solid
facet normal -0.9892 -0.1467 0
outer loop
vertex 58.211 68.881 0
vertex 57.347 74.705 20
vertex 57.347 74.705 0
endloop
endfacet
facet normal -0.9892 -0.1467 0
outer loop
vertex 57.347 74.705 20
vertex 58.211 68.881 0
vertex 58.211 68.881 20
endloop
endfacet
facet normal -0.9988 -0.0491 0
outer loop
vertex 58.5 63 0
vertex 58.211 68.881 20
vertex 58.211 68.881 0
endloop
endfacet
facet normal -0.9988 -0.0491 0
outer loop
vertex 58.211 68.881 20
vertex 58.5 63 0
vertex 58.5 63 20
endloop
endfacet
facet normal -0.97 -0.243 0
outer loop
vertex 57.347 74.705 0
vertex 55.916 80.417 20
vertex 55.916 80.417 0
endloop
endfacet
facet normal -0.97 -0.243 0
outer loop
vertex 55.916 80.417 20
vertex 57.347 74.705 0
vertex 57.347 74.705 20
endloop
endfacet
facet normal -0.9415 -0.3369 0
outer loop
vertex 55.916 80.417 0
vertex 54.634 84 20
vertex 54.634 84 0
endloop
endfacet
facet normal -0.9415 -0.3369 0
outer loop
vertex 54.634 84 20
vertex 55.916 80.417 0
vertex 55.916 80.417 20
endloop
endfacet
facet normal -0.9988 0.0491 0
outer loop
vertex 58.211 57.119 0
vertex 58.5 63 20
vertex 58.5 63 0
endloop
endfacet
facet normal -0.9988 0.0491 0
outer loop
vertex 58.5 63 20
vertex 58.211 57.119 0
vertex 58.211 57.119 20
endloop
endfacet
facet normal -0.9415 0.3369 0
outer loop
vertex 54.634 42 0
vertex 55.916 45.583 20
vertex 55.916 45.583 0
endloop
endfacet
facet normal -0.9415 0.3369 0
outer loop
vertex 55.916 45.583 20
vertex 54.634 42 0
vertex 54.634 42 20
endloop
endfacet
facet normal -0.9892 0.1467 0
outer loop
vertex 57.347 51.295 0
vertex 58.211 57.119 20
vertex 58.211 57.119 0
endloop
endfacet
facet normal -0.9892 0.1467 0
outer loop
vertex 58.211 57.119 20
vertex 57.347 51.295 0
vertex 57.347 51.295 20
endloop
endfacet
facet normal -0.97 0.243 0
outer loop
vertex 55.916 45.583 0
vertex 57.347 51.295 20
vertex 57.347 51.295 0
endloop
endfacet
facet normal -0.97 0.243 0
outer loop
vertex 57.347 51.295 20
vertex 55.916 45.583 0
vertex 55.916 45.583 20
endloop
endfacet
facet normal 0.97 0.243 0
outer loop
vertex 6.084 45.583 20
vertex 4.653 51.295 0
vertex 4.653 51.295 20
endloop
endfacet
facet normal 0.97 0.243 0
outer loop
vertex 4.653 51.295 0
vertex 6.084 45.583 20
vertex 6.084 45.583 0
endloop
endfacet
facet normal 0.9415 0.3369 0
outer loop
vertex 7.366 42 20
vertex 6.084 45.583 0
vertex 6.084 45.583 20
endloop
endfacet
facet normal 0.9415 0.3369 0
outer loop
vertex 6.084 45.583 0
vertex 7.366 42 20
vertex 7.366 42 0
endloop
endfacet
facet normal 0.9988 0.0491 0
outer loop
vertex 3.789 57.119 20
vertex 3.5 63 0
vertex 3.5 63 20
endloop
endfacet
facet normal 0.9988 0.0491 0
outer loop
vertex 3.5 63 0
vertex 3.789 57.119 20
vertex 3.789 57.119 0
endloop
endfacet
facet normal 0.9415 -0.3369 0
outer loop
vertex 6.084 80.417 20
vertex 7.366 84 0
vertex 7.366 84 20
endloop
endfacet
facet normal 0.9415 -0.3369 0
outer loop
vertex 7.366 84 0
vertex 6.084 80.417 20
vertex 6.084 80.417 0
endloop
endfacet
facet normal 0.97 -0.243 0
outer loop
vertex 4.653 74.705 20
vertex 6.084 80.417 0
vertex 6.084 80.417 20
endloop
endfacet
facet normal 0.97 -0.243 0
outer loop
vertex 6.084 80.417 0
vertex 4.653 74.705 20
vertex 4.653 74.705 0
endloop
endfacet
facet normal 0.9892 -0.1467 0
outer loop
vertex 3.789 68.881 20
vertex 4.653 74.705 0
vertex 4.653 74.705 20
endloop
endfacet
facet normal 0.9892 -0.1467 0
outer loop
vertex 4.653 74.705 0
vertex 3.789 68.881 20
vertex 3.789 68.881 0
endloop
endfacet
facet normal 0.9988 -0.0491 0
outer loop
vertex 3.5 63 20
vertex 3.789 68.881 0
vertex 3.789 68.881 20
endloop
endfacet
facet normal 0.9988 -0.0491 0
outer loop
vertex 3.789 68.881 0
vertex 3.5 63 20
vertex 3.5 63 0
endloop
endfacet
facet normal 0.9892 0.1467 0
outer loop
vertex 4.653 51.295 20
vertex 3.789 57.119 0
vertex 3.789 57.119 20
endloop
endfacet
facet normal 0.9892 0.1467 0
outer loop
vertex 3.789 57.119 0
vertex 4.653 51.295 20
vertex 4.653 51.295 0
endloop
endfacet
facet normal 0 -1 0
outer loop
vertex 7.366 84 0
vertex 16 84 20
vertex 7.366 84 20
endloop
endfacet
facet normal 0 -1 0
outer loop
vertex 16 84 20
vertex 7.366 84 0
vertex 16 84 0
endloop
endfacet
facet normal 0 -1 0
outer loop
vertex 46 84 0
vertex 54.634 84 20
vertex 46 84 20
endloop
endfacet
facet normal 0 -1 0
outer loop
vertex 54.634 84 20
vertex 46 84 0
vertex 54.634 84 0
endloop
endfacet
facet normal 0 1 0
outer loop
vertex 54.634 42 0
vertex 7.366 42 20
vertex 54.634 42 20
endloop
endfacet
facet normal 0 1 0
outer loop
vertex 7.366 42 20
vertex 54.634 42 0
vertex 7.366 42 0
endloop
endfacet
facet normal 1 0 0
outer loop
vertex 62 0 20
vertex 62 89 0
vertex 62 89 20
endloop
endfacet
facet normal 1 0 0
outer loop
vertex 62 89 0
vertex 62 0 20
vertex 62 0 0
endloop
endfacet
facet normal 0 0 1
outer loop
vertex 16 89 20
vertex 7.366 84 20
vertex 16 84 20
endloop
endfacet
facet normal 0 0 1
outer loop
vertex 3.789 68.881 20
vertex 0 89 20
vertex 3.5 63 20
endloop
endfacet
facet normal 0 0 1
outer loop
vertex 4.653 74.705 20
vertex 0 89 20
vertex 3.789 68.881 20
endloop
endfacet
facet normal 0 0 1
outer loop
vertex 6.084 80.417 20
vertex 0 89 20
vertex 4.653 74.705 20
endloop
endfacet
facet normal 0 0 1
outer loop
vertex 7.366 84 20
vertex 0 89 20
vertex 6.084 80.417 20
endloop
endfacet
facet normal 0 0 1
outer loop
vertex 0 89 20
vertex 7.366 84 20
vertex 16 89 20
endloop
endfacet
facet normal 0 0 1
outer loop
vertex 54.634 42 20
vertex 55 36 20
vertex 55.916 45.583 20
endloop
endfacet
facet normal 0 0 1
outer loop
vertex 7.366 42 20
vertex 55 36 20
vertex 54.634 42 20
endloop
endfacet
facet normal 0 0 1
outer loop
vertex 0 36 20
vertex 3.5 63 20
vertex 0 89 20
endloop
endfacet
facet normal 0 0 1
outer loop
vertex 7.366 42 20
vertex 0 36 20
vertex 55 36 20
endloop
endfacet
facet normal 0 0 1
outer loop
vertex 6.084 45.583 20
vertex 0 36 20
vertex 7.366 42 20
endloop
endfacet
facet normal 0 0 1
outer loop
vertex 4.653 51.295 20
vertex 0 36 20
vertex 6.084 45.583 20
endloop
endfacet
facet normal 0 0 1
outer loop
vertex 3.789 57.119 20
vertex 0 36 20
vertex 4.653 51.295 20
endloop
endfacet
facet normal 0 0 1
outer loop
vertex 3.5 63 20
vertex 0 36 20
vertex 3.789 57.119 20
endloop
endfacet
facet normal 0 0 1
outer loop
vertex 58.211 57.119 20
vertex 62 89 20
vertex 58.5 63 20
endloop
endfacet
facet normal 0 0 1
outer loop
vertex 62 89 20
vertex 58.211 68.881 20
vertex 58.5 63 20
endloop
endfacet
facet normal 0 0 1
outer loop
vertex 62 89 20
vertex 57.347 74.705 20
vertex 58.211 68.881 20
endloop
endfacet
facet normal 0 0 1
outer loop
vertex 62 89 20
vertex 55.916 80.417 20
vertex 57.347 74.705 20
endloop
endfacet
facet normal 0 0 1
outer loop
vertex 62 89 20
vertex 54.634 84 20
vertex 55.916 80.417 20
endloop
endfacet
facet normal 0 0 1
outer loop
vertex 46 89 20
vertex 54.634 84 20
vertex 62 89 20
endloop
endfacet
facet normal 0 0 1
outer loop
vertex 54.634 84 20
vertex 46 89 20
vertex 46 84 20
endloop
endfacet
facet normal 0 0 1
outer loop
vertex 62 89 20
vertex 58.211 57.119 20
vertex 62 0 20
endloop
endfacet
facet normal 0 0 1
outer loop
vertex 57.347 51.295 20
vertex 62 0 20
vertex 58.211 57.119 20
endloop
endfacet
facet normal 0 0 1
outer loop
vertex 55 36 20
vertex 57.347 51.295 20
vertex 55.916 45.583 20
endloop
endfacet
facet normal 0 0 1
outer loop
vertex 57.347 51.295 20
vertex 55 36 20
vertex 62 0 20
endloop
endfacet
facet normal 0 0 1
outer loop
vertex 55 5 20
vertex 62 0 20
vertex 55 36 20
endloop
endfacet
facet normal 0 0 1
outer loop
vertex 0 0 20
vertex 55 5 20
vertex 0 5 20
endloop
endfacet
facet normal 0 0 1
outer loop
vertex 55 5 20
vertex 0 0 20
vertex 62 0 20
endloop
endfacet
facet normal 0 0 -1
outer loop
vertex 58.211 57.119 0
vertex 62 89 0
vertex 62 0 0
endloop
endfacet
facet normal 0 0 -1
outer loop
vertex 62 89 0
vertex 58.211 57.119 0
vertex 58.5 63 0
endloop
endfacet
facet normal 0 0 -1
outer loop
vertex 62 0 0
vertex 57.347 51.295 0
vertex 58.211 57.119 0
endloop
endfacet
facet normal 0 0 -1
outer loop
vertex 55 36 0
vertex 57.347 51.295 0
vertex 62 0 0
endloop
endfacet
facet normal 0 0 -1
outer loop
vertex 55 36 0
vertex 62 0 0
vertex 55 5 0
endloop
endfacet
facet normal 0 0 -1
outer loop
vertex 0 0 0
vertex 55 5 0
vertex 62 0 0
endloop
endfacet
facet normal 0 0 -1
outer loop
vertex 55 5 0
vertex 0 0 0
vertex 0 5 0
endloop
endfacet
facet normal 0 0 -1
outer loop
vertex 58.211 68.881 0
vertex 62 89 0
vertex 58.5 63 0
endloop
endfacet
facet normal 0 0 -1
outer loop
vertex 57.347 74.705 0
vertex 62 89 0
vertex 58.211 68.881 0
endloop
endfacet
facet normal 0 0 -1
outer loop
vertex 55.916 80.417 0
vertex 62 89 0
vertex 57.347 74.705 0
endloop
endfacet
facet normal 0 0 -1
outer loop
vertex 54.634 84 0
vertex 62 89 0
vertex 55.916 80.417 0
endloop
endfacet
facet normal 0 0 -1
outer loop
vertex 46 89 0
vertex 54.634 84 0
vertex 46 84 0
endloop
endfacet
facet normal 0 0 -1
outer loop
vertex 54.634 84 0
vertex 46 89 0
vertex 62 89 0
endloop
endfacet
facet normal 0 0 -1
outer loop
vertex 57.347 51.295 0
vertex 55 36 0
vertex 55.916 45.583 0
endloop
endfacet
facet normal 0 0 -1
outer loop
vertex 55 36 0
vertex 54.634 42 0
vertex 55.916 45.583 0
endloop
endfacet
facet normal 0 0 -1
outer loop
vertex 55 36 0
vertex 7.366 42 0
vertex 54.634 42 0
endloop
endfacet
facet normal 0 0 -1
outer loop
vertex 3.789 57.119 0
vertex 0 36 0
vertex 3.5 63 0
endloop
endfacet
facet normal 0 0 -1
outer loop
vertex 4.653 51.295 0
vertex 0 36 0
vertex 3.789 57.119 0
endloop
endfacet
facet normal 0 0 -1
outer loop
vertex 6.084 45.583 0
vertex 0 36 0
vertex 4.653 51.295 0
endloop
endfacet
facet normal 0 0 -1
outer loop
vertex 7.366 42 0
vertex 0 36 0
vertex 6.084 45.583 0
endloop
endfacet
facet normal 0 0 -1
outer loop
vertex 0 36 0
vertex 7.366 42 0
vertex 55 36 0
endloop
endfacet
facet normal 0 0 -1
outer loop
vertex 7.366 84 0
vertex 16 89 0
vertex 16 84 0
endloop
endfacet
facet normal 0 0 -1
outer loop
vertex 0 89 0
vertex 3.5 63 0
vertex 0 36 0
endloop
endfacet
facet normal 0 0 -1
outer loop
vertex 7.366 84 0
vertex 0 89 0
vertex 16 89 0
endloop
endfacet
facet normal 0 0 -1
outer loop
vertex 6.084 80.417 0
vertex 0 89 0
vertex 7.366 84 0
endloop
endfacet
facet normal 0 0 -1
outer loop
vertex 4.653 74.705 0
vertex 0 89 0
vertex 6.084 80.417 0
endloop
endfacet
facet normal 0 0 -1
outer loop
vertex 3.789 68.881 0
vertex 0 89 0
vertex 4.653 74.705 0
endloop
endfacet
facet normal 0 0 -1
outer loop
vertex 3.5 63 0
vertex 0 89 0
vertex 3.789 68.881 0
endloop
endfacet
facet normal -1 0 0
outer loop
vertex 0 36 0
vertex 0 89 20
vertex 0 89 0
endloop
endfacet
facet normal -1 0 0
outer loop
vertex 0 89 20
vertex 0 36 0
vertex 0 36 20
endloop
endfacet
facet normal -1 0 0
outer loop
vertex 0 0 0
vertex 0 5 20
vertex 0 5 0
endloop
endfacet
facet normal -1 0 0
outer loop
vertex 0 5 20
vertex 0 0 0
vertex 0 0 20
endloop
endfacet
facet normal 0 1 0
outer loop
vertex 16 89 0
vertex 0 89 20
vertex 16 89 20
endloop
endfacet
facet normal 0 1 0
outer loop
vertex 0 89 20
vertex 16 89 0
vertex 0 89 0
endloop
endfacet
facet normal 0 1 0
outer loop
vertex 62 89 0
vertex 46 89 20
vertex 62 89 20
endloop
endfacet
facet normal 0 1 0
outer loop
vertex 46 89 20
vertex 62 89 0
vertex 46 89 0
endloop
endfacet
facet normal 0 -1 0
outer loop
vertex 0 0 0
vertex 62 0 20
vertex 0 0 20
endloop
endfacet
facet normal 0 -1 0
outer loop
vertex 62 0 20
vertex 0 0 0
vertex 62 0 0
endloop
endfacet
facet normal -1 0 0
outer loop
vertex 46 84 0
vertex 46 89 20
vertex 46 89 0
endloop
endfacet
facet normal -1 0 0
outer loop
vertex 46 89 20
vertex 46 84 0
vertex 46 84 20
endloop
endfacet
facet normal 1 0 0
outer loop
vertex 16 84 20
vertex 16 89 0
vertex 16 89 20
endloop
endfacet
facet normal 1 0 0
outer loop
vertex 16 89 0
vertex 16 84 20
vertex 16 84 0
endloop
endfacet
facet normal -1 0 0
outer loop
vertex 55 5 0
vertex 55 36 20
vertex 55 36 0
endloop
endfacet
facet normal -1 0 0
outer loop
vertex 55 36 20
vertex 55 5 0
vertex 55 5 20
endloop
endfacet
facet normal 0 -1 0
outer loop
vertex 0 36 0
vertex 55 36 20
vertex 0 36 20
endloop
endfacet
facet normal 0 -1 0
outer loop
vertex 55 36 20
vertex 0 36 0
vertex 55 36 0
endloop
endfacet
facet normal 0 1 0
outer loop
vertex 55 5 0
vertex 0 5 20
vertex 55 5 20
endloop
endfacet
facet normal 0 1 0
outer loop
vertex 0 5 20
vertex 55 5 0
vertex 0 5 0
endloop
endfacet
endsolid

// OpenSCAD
// This work is licensed under the Creative Commons Attribution-ShareAlike 4.0
// International License. To view a copy of this license, visit
// http://creativecommons.org/licenses/by-sa/4.0/

$fn = 64;

width = 55;
height = 42;
heightRadius = 60;
bracketThickness = 20;
powerStripOpeningWidth = 30;
clipOpeningWidth = 31;


module powerStripCrossSection(thickness) {
	intersection() {
		translate([width / 2 - heightRadius, 0, 0])
			cylinder(r=heightRadius, h=thickness, center=true);
		translate([heightRadius - width / 2, 0, 0])
			cylinder(r=heightRadius, h=thickness, center=true);
		cube([width, height, thickness], center=true);
	}
}

difference() {
    totalWidth = width + clipOpeningWidth+3;
	cube([62, totalWidth, bracketThickness]);	
    translate([31 - powerStripOpeningWidth/2, totalWidth-6, -1])
		cube([powerStripOpeningWidth, 7, bracketThickness+2]);
	translate([-1, 5, -1])
		cube([56, clipOpeningWidth, bracketThickness + 2]);
    translate([31, totalWidth-5-height/2, bracketThickness/2])
        powerStripCrossSection(bracketThickness+2);
}
